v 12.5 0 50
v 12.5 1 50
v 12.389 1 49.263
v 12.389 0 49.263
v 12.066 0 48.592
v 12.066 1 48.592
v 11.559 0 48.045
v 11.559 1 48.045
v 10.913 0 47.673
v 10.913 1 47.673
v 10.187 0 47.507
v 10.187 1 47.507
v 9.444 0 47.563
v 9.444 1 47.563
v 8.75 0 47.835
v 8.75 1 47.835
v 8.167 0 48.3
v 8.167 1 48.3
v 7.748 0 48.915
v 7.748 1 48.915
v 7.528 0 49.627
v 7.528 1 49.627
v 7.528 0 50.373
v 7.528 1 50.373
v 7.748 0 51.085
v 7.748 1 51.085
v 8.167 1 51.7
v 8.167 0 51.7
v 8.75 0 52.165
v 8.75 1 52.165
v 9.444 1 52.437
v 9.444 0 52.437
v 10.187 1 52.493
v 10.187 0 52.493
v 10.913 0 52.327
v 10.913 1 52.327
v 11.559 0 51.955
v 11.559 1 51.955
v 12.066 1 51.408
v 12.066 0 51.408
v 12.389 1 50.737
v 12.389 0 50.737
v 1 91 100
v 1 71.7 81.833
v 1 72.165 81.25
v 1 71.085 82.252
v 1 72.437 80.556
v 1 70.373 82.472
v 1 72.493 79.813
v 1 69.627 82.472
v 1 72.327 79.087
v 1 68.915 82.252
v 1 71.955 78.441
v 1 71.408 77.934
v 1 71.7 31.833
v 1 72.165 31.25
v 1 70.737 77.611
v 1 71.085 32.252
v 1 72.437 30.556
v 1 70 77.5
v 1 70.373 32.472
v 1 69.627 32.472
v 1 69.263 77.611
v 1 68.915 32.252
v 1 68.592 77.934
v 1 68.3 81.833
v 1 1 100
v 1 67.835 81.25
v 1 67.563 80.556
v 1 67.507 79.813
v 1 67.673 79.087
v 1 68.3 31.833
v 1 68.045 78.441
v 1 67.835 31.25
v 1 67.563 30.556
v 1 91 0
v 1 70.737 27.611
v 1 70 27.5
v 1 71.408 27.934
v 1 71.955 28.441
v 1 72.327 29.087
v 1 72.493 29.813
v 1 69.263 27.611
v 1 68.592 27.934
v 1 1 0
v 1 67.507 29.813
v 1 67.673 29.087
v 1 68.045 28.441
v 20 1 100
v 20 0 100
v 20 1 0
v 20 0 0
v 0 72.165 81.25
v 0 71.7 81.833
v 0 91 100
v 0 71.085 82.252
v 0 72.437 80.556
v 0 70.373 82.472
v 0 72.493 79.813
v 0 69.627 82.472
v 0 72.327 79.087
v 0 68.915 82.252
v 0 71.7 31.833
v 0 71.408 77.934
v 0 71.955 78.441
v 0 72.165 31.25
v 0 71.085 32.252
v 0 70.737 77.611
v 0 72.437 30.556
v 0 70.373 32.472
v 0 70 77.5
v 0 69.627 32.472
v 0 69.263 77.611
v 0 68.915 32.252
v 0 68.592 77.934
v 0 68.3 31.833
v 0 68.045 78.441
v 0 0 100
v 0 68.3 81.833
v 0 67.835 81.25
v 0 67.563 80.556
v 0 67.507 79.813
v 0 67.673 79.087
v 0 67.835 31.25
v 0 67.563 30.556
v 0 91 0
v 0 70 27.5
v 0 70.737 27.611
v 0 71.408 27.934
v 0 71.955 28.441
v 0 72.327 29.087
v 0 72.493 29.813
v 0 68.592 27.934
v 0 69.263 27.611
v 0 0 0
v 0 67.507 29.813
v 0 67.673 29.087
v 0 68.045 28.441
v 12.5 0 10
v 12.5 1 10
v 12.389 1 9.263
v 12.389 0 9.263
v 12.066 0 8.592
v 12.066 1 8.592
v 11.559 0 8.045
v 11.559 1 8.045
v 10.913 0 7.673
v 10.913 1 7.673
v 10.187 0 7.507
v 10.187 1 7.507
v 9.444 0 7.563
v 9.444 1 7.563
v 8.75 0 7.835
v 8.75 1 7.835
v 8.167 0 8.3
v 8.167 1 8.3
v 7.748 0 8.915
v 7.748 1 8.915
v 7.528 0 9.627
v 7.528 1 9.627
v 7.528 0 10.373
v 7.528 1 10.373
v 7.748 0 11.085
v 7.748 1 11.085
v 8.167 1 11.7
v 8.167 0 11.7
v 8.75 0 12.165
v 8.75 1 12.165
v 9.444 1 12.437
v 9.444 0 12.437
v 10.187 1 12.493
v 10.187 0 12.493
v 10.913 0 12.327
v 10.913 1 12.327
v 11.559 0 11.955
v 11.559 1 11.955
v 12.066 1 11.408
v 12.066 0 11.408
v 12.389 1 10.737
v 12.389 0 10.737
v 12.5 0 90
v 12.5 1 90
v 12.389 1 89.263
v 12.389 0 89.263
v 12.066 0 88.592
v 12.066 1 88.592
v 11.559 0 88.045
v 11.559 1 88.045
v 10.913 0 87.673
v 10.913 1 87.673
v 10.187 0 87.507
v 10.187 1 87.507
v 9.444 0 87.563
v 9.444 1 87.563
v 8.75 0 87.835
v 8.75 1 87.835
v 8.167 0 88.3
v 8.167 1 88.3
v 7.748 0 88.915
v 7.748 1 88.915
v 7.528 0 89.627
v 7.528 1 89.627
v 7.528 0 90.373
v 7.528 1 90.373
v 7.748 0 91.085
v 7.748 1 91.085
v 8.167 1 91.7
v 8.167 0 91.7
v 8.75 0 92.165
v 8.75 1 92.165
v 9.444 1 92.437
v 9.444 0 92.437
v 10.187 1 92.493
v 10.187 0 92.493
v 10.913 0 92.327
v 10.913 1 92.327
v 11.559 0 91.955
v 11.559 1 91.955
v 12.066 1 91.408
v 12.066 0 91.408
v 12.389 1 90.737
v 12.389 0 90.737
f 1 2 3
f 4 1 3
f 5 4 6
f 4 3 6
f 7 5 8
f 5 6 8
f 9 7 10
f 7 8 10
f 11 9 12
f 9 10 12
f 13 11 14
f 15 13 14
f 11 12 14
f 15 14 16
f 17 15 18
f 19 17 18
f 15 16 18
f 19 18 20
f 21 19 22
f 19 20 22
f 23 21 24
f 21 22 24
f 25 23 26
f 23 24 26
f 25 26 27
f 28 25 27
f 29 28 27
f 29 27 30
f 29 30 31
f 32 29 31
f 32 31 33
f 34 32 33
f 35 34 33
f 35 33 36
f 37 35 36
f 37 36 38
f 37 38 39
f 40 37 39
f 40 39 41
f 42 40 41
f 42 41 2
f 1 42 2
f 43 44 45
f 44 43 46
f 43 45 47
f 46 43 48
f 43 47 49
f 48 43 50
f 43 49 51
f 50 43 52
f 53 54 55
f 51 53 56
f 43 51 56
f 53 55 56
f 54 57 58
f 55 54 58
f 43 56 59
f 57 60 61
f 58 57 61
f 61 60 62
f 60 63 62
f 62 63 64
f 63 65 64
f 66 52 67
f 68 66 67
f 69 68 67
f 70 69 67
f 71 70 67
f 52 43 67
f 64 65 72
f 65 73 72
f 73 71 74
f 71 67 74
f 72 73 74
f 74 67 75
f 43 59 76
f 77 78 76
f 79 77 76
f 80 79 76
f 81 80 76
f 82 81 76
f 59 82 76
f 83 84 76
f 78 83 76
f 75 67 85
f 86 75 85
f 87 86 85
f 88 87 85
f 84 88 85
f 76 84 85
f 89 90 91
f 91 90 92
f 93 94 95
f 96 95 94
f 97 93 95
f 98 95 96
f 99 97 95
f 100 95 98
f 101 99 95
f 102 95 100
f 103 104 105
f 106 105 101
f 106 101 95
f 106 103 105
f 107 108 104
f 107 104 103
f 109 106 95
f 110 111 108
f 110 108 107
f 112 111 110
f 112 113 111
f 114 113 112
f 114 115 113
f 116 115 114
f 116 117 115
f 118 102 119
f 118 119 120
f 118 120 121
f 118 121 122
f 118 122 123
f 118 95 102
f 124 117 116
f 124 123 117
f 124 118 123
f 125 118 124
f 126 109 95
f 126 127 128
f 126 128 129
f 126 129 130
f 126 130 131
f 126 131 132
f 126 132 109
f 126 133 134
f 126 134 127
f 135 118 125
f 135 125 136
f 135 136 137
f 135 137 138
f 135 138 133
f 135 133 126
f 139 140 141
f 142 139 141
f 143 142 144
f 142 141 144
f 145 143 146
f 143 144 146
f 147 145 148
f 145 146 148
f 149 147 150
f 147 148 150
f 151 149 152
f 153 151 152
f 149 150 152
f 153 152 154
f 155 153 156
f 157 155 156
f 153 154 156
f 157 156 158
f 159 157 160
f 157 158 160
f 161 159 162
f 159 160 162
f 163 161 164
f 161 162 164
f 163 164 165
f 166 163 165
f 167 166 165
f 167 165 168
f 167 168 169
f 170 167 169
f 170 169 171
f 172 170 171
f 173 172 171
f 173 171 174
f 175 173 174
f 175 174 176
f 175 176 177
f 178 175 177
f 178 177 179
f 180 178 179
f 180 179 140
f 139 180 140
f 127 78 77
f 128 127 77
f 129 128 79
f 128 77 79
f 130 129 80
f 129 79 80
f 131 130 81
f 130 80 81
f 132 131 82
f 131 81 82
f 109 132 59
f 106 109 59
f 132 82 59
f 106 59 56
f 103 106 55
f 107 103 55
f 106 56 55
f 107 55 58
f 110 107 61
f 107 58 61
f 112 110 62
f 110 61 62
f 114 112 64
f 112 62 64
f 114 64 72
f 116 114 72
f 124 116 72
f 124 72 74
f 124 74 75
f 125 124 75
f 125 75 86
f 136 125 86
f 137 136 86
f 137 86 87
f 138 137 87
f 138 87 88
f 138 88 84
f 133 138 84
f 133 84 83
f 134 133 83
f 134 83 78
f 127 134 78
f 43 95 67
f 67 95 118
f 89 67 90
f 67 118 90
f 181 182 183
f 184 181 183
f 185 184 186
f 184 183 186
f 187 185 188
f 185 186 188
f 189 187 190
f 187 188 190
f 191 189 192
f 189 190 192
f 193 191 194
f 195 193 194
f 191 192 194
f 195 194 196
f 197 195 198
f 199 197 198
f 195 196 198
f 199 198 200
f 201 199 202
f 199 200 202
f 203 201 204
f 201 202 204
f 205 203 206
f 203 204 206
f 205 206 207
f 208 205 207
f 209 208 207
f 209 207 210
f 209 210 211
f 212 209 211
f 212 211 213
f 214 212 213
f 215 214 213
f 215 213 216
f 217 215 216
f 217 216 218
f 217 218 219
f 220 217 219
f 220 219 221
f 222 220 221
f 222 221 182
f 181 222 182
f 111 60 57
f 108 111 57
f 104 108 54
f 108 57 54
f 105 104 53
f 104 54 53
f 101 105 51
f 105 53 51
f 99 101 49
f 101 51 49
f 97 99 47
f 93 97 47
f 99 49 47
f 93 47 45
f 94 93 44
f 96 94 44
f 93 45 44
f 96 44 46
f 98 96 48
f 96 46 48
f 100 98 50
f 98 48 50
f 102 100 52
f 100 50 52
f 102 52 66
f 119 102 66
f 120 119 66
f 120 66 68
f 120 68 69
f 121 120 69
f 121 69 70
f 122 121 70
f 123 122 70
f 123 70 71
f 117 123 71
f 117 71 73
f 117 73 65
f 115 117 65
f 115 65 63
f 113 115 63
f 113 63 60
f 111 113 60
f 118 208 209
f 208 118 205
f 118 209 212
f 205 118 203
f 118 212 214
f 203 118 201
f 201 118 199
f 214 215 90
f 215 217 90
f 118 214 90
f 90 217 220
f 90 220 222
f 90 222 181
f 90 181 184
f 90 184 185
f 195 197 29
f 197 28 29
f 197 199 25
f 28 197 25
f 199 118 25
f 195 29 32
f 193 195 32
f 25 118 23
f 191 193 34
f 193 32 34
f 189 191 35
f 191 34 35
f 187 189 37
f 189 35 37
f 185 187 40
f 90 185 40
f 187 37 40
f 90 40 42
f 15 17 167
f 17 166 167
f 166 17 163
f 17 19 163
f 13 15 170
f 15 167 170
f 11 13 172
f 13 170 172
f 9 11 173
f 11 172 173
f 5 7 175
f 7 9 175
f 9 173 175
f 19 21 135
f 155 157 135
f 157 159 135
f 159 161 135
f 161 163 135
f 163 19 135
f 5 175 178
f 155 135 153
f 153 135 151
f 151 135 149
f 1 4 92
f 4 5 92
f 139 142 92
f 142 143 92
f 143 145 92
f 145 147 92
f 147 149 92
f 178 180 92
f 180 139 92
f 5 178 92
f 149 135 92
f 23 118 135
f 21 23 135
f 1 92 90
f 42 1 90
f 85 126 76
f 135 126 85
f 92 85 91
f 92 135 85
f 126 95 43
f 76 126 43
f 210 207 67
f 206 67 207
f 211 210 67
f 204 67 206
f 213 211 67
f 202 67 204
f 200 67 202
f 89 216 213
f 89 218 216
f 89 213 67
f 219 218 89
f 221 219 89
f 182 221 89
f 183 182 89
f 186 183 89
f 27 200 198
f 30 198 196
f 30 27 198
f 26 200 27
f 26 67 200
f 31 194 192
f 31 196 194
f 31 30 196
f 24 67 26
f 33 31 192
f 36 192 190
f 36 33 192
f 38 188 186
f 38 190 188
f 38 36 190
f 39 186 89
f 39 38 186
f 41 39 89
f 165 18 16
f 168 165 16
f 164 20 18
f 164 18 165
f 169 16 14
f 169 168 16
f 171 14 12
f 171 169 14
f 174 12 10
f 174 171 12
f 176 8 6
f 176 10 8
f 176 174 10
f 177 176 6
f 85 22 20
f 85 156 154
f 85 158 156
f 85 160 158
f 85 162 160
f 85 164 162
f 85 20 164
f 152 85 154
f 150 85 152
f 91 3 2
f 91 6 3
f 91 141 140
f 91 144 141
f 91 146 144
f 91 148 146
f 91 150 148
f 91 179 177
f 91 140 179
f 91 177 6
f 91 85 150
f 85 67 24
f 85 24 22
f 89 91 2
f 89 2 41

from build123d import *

# Parameters (mm, degrees)
SCHIZZO1_W                   = 20
SCHIZZO1_H                   = 100
ESTRUSIONE_ESTRUSIONE1_DEPTH = 1
SCHIZZO2_W                   = 1
SCHIZZO2_H                   = 100
ESTRUSIONE_ESTRUSIONE2_DEPTH = 90
SCHIZZO3_R                   = 2.5
TAGLIO_ESTRUSIONE1_DEPTH     = 42
SCHIZZO4_R                   = 2.5
TAGLIO_ESTRUSIONE2_DEPTH     = 42


with BuildPart() as part:
    # Schizzo1 → Estrusione-Estrusione1 (new body)
    with BuildSketch(Plane(origin=(0, 0, 0), x_dir=(1, 0, 0), z_dir=(0, 1, 0))):
        with Locations((10, -50)):
            Rectangle(SCHIZZO1_W, SCHIZZO1_H)
    extrude(amount=ESTRUSIONE_ESTRUSIONE1_DEPTH)

    # Schizzo2 → Estrusione-Estrusione2 (add)
    with BuildSketch(Plane(origin=(0, 1, 0), x_dir=(1, 0, 0), z_dir=(0, 1, 0))):
        with Locations((0.5, -50)):
            Rectangle(SCHIZZO2_W, SCHIZZO2_H)
    extrude(amount=ESTRUSIONE_ESTRUSIONE2_DEPTH)

    # Schizzo3 → Taglio-Estrusione1 (cut)
    with BuildSketch(Plane(origin=(0, 1, 0), x_dir=(1, 0, 0), z_dir=(0, 1, 0))):
        with Locations((10, -90)):
            Circle(SCHIZZO3_R)
        with Locations((10, -50)):
            Circle(SCHIZZO3_R)
        with Locations((10, -10)):
            Circle(SCHIZZO3_R)
    extrude(amount=-TAGLIO_ESTRUSIONE1_DEPTH, mode=Mode.SUBTRACT)

    # Schizzo4 → Taglio-Estrusione2 (cut)
    with BuildSketch(Plane(origin=(1, 0, 0), x_dir=(0, 0, -1), z_dir=(1, 0, 0))):
        with Locations((-30, 70)):
            Circle(SCHIZZO4_R)
        with Locations((-80, 70)):
            Circle(SCHIZZO4_R)
    extrude(amount=-TAGLIO_ESTRUSIONE2_DEPTH, mode=Mode.SUBTRACT)


solid = part.part
